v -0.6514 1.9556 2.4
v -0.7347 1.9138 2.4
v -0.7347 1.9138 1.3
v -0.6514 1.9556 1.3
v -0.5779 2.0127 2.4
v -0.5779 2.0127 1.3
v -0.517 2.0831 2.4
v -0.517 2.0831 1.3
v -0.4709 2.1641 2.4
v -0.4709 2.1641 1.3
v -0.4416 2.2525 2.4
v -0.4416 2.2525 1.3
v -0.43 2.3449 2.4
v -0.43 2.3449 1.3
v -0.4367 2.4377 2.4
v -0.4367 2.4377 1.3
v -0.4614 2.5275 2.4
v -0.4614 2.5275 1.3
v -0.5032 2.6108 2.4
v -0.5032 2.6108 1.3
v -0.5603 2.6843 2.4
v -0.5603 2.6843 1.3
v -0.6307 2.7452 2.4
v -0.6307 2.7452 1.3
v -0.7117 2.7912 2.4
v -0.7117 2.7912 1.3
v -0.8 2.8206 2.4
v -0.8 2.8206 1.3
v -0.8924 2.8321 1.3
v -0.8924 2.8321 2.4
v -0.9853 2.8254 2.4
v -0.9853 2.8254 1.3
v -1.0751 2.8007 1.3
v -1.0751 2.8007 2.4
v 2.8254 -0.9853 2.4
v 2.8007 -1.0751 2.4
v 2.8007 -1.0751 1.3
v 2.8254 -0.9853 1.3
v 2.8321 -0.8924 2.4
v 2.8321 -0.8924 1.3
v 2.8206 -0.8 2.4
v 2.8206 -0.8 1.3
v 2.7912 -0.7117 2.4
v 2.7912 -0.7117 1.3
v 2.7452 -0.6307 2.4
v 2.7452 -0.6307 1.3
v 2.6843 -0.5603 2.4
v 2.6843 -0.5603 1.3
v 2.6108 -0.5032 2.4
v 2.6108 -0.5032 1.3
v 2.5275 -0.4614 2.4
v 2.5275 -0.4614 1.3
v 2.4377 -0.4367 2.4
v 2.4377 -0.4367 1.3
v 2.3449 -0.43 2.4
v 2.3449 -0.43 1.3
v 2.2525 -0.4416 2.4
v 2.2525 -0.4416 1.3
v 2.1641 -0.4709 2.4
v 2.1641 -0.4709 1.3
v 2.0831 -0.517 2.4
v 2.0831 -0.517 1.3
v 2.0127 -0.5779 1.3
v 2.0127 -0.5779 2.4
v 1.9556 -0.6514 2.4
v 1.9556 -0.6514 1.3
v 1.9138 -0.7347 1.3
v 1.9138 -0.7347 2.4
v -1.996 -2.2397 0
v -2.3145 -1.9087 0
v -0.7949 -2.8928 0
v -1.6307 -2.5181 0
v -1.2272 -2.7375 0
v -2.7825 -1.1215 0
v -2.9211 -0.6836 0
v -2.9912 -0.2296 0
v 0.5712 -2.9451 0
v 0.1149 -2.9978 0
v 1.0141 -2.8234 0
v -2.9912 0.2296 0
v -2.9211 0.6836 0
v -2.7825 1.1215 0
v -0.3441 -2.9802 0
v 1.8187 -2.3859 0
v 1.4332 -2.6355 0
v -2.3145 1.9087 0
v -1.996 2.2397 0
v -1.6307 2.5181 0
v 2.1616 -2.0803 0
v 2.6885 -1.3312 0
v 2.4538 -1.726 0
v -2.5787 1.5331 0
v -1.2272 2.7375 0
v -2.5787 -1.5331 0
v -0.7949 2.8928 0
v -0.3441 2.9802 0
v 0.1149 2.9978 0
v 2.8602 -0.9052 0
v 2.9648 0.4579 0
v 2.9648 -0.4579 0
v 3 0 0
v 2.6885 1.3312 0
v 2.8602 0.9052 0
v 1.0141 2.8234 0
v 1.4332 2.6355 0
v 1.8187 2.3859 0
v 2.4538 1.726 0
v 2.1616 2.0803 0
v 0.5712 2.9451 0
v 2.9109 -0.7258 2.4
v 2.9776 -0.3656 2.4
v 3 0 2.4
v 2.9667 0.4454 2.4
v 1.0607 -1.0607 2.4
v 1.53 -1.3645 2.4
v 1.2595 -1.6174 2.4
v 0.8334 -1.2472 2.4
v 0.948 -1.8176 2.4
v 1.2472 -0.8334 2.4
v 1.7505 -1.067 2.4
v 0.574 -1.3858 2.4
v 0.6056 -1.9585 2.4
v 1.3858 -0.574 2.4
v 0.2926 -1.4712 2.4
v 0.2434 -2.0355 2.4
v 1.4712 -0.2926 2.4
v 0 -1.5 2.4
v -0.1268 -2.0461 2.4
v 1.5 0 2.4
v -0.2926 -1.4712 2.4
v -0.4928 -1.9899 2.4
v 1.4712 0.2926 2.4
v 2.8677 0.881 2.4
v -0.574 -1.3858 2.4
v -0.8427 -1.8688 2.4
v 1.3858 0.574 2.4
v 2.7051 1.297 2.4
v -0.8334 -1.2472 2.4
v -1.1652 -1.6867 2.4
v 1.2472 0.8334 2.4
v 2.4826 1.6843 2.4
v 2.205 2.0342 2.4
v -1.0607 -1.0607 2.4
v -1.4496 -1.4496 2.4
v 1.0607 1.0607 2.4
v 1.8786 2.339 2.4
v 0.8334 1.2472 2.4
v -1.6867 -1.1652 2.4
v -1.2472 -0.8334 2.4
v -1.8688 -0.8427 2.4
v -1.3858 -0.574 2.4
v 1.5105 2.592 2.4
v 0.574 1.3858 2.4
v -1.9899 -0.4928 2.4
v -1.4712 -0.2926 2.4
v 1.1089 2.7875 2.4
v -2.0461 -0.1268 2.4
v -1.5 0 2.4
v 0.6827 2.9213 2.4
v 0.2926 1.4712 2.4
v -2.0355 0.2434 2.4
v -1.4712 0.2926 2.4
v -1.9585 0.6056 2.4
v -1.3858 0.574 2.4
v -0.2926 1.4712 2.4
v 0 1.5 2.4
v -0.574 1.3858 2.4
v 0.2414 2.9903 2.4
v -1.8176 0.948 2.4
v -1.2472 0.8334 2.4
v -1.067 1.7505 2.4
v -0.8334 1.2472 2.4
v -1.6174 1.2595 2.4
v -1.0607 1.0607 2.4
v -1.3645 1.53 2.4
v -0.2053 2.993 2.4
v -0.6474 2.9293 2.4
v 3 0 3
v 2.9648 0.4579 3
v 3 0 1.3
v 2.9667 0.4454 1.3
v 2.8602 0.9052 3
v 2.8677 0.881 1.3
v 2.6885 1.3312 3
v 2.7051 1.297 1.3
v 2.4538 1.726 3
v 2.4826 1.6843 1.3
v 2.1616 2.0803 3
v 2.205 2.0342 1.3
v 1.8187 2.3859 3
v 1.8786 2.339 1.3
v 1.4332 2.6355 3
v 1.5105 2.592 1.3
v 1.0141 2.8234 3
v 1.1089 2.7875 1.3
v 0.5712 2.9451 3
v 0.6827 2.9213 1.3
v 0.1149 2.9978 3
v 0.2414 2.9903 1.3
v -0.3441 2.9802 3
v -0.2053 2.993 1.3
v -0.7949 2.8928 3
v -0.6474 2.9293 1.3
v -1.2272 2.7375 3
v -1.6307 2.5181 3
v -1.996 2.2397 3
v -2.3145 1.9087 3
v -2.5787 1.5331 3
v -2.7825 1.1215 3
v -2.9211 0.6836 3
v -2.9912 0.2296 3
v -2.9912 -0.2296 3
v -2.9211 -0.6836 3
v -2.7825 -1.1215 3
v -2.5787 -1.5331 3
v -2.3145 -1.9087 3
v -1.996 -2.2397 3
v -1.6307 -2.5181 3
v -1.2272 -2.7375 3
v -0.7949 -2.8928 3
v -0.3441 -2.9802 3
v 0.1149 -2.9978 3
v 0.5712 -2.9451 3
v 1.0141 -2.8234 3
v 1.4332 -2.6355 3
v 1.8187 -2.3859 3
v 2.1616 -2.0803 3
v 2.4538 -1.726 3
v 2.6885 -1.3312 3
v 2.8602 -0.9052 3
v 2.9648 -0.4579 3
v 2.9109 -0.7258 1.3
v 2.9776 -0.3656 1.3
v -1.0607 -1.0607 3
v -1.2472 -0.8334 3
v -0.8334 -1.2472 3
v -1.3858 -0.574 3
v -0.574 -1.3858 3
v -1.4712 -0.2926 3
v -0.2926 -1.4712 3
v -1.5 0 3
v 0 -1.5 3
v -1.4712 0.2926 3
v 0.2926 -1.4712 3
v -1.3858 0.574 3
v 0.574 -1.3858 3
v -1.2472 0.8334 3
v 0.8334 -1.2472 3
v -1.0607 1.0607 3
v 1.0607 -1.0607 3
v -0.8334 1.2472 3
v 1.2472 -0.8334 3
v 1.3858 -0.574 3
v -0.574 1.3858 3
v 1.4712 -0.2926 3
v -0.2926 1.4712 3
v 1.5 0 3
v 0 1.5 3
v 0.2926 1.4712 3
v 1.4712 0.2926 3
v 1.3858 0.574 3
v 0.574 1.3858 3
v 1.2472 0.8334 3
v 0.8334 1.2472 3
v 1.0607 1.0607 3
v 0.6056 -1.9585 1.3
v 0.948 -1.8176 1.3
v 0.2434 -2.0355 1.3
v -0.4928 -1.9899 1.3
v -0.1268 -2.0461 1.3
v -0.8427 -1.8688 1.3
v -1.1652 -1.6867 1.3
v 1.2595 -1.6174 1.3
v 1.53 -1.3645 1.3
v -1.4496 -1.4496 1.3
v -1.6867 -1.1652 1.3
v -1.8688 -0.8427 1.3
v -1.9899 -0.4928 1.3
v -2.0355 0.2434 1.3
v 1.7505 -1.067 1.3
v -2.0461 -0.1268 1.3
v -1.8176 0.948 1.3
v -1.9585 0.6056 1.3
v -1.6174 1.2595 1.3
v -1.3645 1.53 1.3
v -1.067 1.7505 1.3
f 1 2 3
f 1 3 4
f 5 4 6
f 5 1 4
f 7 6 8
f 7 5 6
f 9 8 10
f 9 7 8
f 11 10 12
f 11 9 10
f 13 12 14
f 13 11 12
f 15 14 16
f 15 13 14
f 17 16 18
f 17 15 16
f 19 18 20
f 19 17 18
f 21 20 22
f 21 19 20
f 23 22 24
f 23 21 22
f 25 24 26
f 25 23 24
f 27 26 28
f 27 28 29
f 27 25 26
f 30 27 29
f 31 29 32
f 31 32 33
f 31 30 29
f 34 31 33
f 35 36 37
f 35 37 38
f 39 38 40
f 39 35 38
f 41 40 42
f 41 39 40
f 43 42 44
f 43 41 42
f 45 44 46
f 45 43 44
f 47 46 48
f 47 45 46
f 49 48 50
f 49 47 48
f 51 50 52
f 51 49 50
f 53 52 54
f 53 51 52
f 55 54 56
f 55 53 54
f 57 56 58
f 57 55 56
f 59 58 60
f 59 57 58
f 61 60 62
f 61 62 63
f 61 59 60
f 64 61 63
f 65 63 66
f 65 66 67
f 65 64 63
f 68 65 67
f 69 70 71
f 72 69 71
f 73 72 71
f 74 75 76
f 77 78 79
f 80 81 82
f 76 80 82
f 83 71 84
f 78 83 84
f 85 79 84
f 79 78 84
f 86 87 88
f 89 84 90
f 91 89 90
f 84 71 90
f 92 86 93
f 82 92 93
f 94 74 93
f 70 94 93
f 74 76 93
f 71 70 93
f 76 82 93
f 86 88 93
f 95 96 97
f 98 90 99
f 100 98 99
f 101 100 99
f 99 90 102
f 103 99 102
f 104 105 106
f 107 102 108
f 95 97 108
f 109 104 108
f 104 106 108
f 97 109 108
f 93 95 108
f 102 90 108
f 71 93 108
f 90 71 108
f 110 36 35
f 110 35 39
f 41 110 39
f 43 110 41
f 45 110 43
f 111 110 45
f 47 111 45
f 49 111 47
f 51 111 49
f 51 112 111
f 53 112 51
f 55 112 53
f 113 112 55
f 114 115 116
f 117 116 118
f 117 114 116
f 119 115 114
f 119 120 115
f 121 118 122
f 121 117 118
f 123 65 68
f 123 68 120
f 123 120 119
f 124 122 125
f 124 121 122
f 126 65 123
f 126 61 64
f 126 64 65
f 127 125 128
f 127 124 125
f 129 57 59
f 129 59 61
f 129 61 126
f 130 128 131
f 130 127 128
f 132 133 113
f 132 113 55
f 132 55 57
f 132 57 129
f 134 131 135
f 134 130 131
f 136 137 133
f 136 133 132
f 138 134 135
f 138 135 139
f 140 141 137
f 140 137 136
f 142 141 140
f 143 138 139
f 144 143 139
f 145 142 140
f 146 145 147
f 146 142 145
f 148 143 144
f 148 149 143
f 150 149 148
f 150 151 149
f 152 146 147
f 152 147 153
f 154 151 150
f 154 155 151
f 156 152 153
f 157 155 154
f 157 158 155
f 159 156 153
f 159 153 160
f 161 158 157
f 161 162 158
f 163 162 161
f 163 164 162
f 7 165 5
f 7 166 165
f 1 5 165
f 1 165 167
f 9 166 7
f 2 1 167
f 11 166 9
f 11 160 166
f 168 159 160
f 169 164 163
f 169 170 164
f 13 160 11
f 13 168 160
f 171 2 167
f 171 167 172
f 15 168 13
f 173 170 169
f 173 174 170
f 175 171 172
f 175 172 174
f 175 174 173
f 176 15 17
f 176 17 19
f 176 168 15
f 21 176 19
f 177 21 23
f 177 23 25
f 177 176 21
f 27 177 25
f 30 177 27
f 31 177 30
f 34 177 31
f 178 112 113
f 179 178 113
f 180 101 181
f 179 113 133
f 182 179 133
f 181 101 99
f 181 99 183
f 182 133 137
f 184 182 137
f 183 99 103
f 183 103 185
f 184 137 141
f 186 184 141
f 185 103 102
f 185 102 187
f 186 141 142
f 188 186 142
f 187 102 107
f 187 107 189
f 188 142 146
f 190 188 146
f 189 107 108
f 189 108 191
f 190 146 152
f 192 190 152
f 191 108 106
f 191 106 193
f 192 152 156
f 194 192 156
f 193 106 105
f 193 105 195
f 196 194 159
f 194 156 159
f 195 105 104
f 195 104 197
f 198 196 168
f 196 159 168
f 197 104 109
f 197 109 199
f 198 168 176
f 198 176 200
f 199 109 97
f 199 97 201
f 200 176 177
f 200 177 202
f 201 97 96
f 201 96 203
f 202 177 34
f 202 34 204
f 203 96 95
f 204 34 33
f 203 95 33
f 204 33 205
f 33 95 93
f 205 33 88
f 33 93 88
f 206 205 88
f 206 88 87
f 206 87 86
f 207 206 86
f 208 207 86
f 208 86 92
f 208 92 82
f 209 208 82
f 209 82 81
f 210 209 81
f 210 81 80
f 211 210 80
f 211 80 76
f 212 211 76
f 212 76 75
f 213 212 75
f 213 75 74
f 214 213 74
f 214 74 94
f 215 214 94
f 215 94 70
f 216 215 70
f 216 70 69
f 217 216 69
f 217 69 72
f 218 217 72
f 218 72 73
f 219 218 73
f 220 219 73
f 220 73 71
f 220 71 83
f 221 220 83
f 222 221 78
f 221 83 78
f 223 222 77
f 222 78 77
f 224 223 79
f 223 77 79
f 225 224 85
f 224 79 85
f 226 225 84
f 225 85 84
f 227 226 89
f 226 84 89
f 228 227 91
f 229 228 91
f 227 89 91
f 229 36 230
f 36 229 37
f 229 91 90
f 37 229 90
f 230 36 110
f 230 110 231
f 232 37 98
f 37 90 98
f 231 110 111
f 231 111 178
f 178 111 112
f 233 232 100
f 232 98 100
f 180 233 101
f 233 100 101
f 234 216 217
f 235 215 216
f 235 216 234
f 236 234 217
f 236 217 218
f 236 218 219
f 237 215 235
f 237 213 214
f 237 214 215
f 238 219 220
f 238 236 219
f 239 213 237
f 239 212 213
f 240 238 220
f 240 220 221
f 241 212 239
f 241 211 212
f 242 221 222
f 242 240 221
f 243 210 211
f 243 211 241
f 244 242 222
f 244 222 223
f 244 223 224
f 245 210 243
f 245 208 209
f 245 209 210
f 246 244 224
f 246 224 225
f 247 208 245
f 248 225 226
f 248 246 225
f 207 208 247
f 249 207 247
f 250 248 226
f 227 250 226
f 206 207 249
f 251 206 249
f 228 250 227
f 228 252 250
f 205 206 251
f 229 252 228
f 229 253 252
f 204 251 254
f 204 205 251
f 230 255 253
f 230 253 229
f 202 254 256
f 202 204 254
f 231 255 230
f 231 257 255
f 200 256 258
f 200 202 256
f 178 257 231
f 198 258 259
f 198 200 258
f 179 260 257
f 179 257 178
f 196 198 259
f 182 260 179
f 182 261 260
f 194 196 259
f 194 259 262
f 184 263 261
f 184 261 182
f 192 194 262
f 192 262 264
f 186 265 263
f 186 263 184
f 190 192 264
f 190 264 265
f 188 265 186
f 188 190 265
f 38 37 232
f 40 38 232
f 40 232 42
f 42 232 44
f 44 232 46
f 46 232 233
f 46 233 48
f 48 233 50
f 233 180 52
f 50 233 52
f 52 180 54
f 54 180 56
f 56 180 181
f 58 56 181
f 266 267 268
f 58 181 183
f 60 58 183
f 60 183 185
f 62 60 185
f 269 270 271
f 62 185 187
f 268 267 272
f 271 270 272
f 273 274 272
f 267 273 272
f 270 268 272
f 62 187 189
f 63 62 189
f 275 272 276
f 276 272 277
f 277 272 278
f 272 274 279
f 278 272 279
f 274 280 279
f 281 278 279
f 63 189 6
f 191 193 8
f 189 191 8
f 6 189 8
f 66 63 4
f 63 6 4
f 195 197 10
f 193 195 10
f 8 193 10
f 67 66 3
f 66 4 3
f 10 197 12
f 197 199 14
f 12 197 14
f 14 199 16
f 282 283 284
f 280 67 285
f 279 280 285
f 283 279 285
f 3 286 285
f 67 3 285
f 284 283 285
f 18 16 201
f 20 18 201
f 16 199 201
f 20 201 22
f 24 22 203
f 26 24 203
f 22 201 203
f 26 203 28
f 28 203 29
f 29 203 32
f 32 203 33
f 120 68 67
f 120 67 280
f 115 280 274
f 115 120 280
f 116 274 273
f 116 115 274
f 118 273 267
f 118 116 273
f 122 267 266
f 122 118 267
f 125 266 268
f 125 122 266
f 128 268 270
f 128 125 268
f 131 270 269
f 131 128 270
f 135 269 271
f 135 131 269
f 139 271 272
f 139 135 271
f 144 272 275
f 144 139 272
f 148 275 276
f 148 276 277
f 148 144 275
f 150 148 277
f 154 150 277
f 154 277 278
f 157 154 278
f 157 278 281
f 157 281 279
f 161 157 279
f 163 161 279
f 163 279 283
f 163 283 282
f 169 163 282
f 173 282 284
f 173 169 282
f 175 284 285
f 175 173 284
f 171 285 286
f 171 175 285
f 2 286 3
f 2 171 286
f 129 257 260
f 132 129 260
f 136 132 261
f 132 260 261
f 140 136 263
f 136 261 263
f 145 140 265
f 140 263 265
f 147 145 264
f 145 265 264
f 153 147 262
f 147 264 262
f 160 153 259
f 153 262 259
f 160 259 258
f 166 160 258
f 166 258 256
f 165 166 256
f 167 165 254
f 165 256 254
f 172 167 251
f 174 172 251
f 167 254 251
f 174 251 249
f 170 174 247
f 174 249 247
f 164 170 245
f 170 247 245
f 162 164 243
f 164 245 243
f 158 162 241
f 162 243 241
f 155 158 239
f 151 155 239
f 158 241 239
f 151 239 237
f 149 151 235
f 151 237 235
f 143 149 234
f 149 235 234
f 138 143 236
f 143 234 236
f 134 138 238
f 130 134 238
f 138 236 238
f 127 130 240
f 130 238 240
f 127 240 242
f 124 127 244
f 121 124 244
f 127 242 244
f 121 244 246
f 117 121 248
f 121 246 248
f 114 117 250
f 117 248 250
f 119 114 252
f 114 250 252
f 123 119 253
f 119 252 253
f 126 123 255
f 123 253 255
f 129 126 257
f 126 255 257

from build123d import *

# Parameters (mm, degrees)
SKETCH_1_R          = 3
EXTRUDE_1_DEPTH     = 3
SKETCH_2_R          = 1.5
CUT_EXTRUDE_1_DEPTH = 0.6
CUT_EXTRUDE_2_DEPTH = 1.1


with BuildPart() as part:
    # 草图1 → 凸台-拉伸1 (new body)
    with BuildSketch(Plane.XY):
        Circle(SKETCH_1_R)
    extrude(amount=EXTRUDE_1_DEPTH)

    # 草图2 → 切除-拉伸1 (cut)
    with BuildSketch(Plane.XY.offset(3)):
        Circle(SKETCH_2_R)
    extrude(amount=-CUT_EXTRUDE_1_DEPTH, mode=Mode.SUBTRACT)

    # 草图3 → 切除-拉伸2 (cut)
    with BuildSketch(Plane.XY.offset(2.4)):
        with BuildLine():
            Line((-1.075103849, 2.800741279), (-1.343879811, 3.500926599))
            ThreePointArc((-1.343879811, 3.500926599), (2.651650429, 2.651650429), (3.500926599, -1.343879811))
            Line((3.500926599, -1.343879811), (2.800741279, -1.075103849))
            ThreePointArc((2.800741279, -1.075103849), (2.527515353, -0.46142837), (1.913839874, -0.734654297))
            ThreePointArc((1.913839874, -0.734654297), (-1.449568901, -1.449568901), (-0.734654297, 1.913839874))
            ThreePointArc((-0.734654297, 1.913839874), (-0.46142837, 2.527515353), (-1.075103849, 2.800741279))
        make_face()
    extrude(amount=-CUT_EXTRUDE_2_DEPTH, mode=Mode.SUBTRACT)


solid = part.part
